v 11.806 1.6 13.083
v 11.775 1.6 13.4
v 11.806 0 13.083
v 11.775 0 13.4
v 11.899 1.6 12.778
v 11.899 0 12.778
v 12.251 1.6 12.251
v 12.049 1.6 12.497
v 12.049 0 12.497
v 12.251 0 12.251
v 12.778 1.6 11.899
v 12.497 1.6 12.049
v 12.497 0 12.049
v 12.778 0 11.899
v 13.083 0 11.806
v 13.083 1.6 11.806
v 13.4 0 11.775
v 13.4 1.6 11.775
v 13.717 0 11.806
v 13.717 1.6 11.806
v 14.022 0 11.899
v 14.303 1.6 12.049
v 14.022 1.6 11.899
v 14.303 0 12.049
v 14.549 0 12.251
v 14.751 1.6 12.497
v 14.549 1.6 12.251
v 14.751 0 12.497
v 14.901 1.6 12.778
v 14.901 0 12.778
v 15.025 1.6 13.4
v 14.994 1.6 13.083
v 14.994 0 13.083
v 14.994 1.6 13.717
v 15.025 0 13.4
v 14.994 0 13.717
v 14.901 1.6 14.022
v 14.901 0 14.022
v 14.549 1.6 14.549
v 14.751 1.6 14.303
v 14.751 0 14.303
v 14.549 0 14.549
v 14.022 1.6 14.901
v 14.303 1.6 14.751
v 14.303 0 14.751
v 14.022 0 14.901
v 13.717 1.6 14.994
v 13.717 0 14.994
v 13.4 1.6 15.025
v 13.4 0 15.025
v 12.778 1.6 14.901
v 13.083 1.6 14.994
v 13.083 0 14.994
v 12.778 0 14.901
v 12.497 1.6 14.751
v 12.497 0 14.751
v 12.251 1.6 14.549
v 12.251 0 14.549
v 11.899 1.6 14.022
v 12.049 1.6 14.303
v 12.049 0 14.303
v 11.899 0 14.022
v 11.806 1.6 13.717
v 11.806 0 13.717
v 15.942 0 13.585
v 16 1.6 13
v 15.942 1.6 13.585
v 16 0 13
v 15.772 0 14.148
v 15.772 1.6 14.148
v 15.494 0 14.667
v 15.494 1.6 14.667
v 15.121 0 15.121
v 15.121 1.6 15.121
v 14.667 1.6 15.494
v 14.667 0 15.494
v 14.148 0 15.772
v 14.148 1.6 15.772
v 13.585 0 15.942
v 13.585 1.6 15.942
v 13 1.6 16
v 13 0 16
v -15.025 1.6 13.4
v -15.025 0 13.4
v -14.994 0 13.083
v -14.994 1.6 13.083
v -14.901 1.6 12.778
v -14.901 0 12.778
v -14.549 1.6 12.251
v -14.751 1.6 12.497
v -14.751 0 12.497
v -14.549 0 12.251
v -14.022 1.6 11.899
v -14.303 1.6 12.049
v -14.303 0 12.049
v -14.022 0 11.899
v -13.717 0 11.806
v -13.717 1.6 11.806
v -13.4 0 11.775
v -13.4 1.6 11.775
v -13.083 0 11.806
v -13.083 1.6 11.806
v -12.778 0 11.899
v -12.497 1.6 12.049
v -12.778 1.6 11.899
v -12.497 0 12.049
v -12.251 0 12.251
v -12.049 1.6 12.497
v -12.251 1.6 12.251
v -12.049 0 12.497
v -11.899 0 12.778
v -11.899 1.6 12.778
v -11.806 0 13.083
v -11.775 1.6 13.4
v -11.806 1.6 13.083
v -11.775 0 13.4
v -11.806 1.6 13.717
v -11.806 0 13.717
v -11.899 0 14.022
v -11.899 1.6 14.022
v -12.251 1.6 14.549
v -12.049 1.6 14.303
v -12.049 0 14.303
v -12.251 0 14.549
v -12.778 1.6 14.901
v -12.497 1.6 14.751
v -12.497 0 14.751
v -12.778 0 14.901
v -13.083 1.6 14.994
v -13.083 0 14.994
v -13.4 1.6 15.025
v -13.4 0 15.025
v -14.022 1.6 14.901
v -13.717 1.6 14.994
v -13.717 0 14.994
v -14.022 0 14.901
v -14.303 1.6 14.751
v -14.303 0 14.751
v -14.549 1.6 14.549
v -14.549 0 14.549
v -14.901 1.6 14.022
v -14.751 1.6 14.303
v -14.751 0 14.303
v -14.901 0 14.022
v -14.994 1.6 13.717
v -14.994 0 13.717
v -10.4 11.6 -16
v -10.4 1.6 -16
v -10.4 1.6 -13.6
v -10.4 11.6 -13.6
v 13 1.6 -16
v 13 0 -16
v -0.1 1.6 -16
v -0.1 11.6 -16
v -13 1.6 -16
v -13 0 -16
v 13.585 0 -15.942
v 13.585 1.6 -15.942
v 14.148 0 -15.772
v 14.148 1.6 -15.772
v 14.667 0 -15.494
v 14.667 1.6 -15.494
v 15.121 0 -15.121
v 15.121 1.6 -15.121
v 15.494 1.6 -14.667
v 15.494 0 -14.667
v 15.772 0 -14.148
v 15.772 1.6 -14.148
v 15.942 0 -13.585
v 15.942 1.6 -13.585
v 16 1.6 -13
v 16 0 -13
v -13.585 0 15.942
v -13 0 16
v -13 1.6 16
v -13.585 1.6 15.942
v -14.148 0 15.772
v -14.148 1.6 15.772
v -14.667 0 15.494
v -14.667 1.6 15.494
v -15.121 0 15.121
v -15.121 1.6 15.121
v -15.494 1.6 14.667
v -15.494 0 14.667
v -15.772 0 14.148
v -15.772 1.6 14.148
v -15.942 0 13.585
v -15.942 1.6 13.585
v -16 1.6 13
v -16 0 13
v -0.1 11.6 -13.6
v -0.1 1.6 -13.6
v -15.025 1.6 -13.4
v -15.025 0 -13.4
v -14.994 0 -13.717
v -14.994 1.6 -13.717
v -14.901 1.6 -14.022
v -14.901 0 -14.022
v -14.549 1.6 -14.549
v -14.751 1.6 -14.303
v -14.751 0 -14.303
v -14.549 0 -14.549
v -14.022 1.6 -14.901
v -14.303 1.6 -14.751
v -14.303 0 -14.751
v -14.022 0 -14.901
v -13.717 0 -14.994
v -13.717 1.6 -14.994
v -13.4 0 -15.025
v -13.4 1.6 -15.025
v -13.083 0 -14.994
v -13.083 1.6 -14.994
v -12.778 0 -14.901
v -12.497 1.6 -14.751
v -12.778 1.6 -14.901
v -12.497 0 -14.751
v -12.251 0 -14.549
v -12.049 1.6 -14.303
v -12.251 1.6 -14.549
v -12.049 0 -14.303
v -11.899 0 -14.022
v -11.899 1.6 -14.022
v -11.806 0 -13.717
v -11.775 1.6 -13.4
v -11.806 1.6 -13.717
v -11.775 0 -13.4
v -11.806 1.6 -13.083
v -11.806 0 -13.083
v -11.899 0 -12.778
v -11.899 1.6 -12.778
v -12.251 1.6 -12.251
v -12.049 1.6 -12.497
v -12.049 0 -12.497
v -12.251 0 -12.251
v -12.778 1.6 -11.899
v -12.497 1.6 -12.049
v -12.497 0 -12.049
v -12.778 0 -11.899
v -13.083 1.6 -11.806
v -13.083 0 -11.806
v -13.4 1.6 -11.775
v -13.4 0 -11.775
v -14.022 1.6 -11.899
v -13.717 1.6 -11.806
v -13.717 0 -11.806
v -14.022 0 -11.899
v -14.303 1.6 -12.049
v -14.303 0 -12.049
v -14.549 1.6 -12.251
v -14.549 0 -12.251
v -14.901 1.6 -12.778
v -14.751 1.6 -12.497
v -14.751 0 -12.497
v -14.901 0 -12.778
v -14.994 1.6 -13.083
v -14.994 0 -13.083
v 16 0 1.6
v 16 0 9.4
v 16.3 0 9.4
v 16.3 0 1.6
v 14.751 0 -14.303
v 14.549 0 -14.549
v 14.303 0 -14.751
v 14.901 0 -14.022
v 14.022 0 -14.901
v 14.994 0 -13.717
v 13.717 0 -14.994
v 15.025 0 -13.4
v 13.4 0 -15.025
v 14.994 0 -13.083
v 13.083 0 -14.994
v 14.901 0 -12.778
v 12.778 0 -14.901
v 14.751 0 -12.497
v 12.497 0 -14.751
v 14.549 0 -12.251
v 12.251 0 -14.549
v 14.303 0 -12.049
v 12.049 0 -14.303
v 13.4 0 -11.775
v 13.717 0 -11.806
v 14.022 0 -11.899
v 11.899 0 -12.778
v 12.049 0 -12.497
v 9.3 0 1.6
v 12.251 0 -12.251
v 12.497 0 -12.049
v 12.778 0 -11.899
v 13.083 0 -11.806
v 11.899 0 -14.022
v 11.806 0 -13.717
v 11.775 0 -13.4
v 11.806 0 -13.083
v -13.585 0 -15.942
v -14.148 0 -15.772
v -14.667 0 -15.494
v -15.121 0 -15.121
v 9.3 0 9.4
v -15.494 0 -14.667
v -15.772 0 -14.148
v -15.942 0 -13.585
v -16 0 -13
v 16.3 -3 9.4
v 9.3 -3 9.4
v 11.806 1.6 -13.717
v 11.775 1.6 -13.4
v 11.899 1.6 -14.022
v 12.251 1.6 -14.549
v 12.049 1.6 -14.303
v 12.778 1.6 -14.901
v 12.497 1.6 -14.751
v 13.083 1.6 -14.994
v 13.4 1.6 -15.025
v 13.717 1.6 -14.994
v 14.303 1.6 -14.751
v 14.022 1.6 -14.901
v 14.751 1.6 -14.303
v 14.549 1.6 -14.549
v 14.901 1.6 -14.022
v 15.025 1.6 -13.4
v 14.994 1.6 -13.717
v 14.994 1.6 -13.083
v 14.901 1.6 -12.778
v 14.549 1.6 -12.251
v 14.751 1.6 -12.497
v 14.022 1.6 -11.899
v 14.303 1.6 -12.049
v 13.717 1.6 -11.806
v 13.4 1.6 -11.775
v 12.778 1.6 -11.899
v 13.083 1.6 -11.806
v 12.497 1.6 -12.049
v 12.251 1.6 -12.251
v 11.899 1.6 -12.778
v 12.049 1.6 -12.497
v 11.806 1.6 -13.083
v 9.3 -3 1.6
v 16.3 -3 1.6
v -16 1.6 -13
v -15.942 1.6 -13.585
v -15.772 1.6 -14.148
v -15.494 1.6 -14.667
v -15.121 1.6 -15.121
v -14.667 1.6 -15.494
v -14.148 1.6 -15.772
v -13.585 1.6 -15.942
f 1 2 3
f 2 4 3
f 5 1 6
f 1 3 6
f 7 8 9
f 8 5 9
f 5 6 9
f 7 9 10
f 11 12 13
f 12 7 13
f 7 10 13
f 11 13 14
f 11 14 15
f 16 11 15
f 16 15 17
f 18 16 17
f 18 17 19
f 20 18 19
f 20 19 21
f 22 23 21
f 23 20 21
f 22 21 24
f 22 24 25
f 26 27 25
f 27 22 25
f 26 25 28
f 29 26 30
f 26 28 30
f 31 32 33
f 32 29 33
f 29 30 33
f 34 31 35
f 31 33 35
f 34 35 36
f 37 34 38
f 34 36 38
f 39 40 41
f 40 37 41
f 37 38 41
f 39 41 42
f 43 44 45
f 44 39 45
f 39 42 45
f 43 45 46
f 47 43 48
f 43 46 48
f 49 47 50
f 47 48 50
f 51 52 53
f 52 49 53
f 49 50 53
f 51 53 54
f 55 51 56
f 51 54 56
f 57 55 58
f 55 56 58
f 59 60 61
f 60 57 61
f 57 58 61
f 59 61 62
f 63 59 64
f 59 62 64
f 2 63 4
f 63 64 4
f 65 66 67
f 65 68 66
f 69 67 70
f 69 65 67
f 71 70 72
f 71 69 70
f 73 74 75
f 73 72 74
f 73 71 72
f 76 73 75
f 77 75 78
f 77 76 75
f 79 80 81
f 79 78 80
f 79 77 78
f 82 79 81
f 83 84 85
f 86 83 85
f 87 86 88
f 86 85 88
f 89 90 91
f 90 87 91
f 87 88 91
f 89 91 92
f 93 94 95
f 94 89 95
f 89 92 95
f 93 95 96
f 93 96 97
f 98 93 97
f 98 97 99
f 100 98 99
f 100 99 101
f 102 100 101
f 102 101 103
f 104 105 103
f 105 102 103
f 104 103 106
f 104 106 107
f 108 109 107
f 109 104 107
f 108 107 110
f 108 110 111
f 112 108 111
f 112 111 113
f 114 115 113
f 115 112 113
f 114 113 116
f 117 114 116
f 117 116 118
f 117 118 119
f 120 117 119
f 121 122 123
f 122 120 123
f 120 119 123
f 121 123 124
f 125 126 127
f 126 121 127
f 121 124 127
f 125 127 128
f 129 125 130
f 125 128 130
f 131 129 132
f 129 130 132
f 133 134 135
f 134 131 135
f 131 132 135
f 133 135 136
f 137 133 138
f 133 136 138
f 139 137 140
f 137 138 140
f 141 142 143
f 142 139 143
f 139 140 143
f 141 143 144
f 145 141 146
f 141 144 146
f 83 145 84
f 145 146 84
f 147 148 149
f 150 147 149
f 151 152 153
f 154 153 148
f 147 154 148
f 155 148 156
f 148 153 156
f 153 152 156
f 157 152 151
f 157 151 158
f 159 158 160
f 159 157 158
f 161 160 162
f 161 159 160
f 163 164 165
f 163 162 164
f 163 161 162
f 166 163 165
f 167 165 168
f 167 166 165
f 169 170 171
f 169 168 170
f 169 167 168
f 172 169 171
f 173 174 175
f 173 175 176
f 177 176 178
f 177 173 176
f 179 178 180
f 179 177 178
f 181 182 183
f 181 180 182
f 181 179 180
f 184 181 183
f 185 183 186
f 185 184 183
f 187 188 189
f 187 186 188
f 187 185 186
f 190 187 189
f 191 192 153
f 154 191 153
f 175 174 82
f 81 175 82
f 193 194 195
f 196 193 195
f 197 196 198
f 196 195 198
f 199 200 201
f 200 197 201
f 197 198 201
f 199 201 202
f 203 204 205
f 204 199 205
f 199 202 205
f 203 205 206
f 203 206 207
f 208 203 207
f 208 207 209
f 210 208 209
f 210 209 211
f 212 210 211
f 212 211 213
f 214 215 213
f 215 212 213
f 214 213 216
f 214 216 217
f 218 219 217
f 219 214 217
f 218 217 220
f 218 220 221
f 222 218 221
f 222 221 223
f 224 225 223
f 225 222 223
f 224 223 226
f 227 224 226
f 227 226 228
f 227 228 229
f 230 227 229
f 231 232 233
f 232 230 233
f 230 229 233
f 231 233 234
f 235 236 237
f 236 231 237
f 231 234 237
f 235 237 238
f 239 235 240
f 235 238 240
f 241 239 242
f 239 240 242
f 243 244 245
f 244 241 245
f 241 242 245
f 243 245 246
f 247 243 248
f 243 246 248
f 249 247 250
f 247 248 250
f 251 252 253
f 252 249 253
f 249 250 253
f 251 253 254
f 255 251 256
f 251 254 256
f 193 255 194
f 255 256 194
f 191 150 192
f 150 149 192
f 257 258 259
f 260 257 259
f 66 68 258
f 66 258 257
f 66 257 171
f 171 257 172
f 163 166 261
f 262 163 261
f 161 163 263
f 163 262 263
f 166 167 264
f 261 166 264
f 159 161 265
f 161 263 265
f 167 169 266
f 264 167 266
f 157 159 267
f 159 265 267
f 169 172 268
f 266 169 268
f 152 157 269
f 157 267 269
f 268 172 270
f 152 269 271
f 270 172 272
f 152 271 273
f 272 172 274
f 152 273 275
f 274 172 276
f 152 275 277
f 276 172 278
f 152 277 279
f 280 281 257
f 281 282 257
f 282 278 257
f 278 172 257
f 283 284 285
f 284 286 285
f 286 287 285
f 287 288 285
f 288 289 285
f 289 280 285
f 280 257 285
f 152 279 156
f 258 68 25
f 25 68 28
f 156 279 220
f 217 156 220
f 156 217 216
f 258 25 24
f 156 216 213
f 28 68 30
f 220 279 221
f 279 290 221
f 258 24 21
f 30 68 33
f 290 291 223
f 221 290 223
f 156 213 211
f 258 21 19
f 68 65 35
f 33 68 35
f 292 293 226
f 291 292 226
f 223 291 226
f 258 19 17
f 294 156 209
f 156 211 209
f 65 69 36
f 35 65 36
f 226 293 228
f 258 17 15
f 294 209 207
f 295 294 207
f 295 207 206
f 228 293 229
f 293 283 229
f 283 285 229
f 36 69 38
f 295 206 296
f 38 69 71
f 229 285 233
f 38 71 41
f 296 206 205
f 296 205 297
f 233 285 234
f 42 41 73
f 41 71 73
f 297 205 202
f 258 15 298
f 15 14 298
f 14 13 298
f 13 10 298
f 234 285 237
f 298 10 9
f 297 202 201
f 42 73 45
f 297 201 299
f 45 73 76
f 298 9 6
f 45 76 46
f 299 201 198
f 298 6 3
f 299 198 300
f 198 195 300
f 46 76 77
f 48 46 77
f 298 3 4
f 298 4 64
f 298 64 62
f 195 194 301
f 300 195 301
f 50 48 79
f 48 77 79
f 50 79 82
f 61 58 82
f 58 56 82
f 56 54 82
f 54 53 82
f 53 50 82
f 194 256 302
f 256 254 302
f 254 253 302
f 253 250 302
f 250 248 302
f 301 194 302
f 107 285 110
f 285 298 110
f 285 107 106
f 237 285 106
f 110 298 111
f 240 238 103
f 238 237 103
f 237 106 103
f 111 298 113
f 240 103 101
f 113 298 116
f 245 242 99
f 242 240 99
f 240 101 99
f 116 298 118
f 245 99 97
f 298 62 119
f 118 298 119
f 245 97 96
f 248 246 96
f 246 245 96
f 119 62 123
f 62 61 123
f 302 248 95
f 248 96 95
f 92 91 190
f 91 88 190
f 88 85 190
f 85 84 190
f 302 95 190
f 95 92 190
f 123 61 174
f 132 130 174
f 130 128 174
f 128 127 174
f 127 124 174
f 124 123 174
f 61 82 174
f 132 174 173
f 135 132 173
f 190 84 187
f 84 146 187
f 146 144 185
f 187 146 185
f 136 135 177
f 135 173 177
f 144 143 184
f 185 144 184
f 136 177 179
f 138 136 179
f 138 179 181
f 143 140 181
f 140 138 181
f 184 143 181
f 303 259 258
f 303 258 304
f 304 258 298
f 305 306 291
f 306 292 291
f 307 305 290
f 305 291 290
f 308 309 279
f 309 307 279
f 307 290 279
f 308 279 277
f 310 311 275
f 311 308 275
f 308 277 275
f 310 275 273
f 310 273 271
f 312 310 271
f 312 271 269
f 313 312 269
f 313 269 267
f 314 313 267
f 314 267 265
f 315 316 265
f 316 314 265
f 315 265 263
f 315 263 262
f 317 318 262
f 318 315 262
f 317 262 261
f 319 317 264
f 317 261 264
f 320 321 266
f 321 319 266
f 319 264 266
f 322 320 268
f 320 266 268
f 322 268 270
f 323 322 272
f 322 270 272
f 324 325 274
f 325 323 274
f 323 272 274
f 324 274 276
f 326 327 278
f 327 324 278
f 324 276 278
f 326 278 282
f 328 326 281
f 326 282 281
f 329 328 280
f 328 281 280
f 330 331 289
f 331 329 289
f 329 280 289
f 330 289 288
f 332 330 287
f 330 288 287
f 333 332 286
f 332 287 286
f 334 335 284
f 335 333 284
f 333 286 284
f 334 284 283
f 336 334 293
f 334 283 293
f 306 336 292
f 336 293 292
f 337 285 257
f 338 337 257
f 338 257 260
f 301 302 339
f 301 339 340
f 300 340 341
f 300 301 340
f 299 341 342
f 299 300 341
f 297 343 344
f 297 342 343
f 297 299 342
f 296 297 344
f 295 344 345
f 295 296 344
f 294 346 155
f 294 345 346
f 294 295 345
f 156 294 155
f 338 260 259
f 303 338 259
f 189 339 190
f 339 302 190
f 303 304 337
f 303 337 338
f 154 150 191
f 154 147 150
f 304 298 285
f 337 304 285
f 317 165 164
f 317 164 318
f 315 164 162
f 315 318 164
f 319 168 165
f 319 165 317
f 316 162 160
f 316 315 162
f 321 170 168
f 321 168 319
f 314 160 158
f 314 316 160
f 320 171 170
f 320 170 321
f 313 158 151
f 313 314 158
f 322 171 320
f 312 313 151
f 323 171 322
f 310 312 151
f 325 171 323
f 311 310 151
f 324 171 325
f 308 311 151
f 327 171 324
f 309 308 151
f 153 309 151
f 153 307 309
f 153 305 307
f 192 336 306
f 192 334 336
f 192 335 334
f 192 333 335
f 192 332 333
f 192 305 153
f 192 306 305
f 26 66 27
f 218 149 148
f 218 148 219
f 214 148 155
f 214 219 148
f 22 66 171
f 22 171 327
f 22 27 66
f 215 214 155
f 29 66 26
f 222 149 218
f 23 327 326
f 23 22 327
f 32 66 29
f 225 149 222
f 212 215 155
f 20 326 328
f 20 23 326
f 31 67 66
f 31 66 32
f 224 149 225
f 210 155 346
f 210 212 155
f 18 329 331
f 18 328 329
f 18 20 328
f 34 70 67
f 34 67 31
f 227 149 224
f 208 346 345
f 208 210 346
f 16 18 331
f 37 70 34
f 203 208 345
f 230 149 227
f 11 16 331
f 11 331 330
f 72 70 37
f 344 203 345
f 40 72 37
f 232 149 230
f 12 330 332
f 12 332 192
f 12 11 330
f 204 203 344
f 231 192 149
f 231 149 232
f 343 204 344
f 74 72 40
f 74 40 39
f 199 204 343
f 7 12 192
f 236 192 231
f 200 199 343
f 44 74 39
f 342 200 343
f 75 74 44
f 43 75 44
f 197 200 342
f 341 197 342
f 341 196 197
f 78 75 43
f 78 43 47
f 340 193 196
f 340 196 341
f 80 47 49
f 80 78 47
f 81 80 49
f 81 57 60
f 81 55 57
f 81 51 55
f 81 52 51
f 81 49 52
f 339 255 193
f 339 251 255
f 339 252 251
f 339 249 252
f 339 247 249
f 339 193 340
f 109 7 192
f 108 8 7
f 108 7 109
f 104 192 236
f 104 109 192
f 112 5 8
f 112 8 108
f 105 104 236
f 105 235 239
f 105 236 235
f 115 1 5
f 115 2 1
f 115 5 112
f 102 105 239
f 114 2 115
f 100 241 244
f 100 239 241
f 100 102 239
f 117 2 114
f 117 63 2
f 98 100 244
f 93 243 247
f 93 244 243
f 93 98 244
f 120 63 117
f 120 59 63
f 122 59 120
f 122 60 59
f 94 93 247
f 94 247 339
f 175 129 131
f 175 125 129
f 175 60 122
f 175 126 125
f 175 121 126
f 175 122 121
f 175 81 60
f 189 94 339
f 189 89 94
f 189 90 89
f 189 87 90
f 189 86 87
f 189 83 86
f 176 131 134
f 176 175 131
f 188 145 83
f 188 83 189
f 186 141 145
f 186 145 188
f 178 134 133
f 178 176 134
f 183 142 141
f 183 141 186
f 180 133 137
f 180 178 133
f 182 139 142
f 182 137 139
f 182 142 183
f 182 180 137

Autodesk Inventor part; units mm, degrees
ref_plane "YZ Plane" through (0, 0, 0) normal (1, 0, 0) x (0, 1, 0)
ref_plane "XZ Plane" through (0, 0, 0) normal (0, 1, 0) x (-1, 0, 0)
ref_plane "XY Plane" through (0, 0, 0) normal (0, 0, 1) x (1, 0, 0)
sketch "Эскиз1" plane through (0, 0, 0) normal (0, 1, 0) x (-1, 0, 0)
  line L0 (13, 16) -> (-13, 16)
  line L1 (-16, 13) -> (-16, -13)
  line L2 (-13, -16) -> (13, -16)
  line L3 (16, -13) -> (16, 13)
  line L4 (0, 0) -> (32.4367, 0) construction
  line L5 (0, 0) -> (0, -34.7046) construction
  circle A0 centre (13.4, -13.4) radius 1.625
  circle A1 centre (-13.4, -13.4) radius 1.625
  circle A2 centre (13.4, 13.4) radius 1.625
  circle A3 centre (-13.4, 13.4) radius 1.625
  arc A4 (16, 13) -> (13, 16) centre (13, 13) ccw
  arc A5 (13, -16) -> (16, -13) centre (13, -13) ccw
  arc A6 (-16, -13) -> (-13, -16) centre (-13, -13) ccw
  arc A7 (-13, 16) -> (-16, 13) centre (-13, 13) ccw
  point P0 (-16, -16)
  point P1 (-16, 16)
  point P2 (16, -16)
  dimension "d0" = 32
  dimension "d1" = 32
  dimension "d2" = 3.25
  dimension "d3" = 26.8
  dimension "d4" = 26.8
  dimension "d5" = 3
extrude "Выдавливание1" add sketch "Эскиз1" along normal blind 1.6
sketch "Эскиз2" plane through (0, 1.6, 0) normal (0, 1, 0) x (1, 0, 0)
  line L0 (-10.4, 13.6) -> (-0.1, 13.6)
  line L1 (-0.1, 13.6) -> (-0.1, 16)
  line L2 (-0.1, 16) -> (-10.4, 16)
  line L3 (-10.4, 16) -> (-10.4, 13.6)
  line L4 (-13, -16) -> (13, -16) construction
  arc A0 (13, -16) -> (16, -13) centre (13, -13) ccw construction
  line L5 (16, -13) -> (16, 13) construction
  arc A1 (16, 13) -> (13, 16) centre (13, 13) ccw construction
  line L6 (13, 16) -> (-13, 16) construction
  arc A2 (-13, 16) -> (-16, 13) centre (-13, 13) ccw construction
  line L7 (-16, 13) -> (-16, -13) construction
  arc A3 (-16, -13) -> (-13, -16) centre (-13, -13) ccw construction
  circle A4 centre (13.4, 13.4) radius 1.625 construction
  circle A5 centre (13.4, -13.4) radius 1.625 construction
  circle A6 centre (-13.4, -13.4) radius 1.625 construction
  circle A7 centre (-13.4, 13.4) radius 1.625 construction
  point P0 (0, 0)
  dimension "d8" = 10.3
  dimension "d9" = 2.4
  dimension "d10" = 5.6
extrude "Выдавливание2" add sketch "Эскиз2" along normal blind 10
sketch "Эскиз3" plane through (0, 0, 0) normal (0, -1, 0) x (1, 0, 0)
  line L0 (16.3, 9.4) -> (9.3, 9.4)
  line L1 (9.3, 9.4) -> (9.3, 1.6)
  line L2 (9.3, 1.6) -> (16.3, 1.6)
  line L3 (16.3, 1.6) -> (16.3, 9.4)
  line L4 (-13, 16) -> (13, 16) construction
  arc A0 (-13, 16) -> (-16, 13) centre (-13, 13) ccw construction
  line L5 (-16, -13) -> (-16, 13) construction
  arc A1 (-16, -13) -> (-13, -16) centre (-13, -13) ccw construction
  line L6 (13, -16) -> (-13, -16) construction
  arc A2 (13, -16) -> (16, -13) centre (13, -13) ccw construction
  line L7 (16, 13) -> (16, -13) construction
  arc A3 (16, 13) -> (13, 16) centre (13, 13) ccw construction
  circle A4 centre (13.4, -13.4) radius 1.625 construction
  circle A5 centre (13.4, 13.4) radius 1.625 construction
  circle A6 centre (-13.4, 13.4) radius 1.625 construction
  circle A7 centre (-13.4, -13.4) radius 1.625 construction
  point P0 (0, 0)
  dimension "d13" = 0.3
  dimension "d14" = 7.8
  dimension "d15" = 7
  dimension "d16" = 6.6
extrude "Выдавливание3" add sketch "Эскиз3" along normal blind 3
properties part number "razor_sketch"
